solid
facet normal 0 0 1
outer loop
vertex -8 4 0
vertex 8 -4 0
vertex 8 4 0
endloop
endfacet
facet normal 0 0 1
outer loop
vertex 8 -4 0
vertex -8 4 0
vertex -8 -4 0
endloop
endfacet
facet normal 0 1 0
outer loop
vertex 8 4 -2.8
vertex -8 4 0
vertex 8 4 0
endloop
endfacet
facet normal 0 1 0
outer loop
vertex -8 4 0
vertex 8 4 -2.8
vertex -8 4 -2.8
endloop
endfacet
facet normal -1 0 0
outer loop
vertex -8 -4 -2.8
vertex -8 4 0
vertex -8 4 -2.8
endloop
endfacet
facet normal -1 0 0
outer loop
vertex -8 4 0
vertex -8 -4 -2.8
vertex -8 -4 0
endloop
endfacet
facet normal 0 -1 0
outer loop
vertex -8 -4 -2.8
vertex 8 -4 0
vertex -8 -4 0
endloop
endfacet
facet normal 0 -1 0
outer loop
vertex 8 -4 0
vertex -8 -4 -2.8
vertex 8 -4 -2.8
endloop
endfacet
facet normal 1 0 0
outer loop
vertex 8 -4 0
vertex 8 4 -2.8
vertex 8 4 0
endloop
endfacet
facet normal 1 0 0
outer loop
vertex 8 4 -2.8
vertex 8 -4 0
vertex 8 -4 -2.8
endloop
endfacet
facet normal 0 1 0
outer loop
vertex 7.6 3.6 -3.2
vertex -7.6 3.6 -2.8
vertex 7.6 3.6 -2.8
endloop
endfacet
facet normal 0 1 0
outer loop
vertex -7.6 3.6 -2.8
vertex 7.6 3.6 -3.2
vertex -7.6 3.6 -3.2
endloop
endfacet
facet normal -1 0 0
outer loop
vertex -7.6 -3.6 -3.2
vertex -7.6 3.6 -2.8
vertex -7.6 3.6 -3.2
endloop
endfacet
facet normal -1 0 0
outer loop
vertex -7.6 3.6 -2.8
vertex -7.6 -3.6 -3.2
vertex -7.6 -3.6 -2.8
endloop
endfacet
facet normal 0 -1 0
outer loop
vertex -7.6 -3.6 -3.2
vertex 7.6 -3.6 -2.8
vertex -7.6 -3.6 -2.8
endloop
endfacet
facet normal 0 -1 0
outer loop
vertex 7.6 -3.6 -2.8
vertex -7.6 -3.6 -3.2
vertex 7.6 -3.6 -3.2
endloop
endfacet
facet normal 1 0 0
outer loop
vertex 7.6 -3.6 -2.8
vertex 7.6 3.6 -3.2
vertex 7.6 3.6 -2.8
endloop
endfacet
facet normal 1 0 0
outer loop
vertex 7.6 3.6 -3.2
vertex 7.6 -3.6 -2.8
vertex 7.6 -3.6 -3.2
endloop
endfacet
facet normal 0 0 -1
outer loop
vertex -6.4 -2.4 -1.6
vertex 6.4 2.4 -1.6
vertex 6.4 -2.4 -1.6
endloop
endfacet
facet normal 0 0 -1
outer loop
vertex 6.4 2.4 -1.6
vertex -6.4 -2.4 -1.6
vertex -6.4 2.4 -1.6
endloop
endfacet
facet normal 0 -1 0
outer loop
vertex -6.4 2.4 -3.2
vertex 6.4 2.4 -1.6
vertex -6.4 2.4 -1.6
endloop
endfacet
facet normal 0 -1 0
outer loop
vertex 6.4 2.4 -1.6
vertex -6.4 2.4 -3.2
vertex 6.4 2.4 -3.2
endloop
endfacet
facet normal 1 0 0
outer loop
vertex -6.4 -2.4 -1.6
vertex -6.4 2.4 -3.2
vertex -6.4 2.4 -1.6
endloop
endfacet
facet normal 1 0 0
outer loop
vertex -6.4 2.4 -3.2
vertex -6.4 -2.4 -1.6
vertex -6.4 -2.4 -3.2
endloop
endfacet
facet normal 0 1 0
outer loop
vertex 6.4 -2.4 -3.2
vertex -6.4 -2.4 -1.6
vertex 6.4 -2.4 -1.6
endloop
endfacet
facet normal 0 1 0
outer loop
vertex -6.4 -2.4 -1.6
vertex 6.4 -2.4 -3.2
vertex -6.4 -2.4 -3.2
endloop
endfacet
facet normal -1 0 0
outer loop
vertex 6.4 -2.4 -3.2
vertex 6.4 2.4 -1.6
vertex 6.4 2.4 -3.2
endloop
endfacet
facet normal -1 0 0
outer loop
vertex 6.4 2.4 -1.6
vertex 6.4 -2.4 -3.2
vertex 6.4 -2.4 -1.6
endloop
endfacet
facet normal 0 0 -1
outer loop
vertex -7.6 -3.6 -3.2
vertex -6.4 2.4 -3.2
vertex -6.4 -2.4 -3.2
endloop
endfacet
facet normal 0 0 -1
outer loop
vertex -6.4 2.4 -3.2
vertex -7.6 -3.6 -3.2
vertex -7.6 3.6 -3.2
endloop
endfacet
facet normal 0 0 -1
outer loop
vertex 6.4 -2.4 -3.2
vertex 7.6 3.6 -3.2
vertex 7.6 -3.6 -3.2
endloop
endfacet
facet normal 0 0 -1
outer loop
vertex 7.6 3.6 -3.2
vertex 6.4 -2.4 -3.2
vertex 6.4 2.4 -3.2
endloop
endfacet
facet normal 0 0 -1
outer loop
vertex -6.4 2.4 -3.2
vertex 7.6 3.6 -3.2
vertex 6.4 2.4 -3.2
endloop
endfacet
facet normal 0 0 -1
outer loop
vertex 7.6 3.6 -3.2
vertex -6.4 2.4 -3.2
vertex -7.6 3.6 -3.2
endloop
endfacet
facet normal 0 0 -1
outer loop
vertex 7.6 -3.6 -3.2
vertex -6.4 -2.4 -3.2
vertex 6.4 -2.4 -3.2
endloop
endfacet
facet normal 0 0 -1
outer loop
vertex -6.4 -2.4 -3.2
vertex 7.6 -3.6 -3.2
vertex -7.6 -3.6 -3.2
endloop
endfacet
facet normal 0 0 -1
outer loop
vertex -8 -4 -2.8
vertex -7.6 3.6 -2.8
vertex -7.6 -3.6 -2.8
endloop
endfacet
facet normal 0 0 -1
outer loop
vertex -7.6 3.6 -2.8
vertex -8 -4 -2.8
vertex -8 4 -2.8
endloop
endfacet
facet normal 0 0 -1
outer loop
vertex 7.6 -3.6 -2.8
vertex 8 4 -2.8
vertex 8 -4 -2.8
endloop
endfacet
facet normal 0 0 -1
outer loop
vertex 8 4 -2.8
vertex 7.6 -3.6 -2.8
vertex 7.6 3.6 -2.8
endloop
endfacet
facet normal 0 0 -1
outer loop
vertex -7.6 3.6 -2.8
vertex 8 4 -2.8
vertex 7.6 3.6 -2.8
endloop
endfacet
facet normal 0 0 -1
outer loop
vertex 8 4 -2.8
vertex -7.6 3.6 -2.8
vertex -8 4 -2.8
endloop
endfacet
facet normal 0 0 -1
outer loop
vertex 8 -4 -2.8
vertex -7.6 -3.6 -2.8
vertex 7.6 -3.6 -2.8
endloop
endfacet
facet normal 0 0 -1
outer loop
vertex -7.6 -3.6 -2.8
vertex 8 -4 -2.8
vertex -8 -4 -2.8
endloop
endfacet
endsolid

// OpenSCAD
// file: ../p/box5.scad
use <../lib.scad>
function ldraw_lib__box5() = [
// 0 Box with 5 Faces and All Edges
// 0 Name: box5.dat
// 0 Author: James Jessiman
// 0 !LDRAW_ORG Primitive UPDATE 2012-01
// 0 !LICENSE Licensed under CC BY 2.0 and CC BY 4.0 : see CAreadme.txt
// 
// 0 BFC CERTIFY CCW
  [0,"BFC","CERTIFY"],
  [0,"BFC","CCW"],
// 
// 0 !HISTORY 2002-04-03 [sbliss] Modified for BFC compliance
// 0 !HISTORY 2002-04-25 [PTadmin] Official Update 2002-02
// 0 !HISTORY 2007-06-24 [PTadmin] Header formatted for Contributor Agreement
// 0 !HISTORY 2008-07-01 [PTadmin] Official Update 2008-01
// 0 !HISTORY 2012-02-16 [Philo] Changed to CCW
// 0 !HISTORY 2012-03-30 [PTadmin] Official Update 2012-01
// 
// 
// 2 24 1 1 1 -1 1 1
  [2,24,1,1,1,-1,1,1],
// 2 24 -1 1 1 -1 1 -1
  [2,24,-1,1,1,-1,1,-1],
// 2 24 -1 1 -1 1 1 -1
  [2,24,-1,1,-1,1,1,-1],
// 2 24 1 1 -1 1 1 1
  [2,24,1,1,-1,1,1,1],
// 2 24 1 0 1 -1 0 1
  [2,24,1,0,1,-1,0,1],
// 2 24 -1 0 1 -1 0 -1
  [2,24,-1,0,1,-1,0,-1],
// 2 24 -1 0 -1 1 0 -1
  [2,24,-1,0,-1,1,0,-1],
// 2 24 1 0 -1 1 0 1
  [2,24,1,0,-1,1,0,1],
// 2 24 1 0 1 1 1 1
  [2,24,1,0,1,1,1,1],
// 2 24 -1 0 1 -1 1 1
  [2,24,-1,0,1,-1,1,1],
// 2 24 1 0 -1 1 1 -1
  [2,24,1,0,-1,1,1,-1],
// 2 24 -1 0 -1 -1 1 -1
  [2,24,-1,0,-1,-1,1,-1],
// 4 16 -1 1 1 1 1 1 1 1 -1 -1 1 -1
  [4,16,-1,1,1,1,1,1,1,1,-1,-1,1,-1],
// 4 16 -1 1 1 -1 0 1 1 0 1 1 1 1
  [4,16,-1,1,1,-1,0,1,1,0,1,1,1,1],
// 4 16 -1 1 -1 -1 0 -1 -1 0 1 -1 1 1
  [4,16,-1,1,-1,-1,0,-1,-1,0,1,-1,1,1],
// 4 16 1 1 -1 1 0 -1 -1 0 -1 -1 1 -1
  [4,16,1,1,-1,1,0,-1,-1,0,-1,-1,1,-1],
// 4 16 1 1 1 1 0 1 1 0 -1 1 1 -1
  [4,16,1,1,1,1,0,1,1,0,-1,1,1,-1],
];
makepoly(ldraw_lib__box5(), line=0.2);
// file: ../p/box4.scad
use <../lib.scad>
function ldraw_lib__box4() = [
// 0 Box with 4 Faces (2 Parallel Pairs) and All Edges
// 0 Name: box4.dat
// 0 Author: James Jessiman
// 0 !LDRAW_ORG Primitive UPDATE 2012-01
// 0 !LICENSE Licensed under CC BY 2.0 and CC BY 4.0 : see CAreadme.txt
// 
// 0 BFC CERTIFY CCW
  [0,"BFC","CERTIFY"],
  [0,"BFC","CCW"],
// 
// 0 !HISTORY 2002-04-03 [sbliss] Modified for BFC compliance
// 0 !HISTORY 2002-04-25 [PTadmin] Official Update 2002-02
// 0 !HISTORY 2007-06-24 [PTadmin] Header formatted for Contributor Agreement
// 0 !HISTORY 2008-07-01 [PTadmin] Official Update 2008-01
// 0 !HISTORY 2012-02-16 [Philo] Changed to CCW
// 0 !HISTORY 2012-03-30 [PTadmin] Official Update 2012-01
// 
// 
// 2 24 1 1 1 -1 1 1
  [2,24,1,1,1,-1,1,1],
// 2 24 -1 1 1 -1 1 -1
  [2,24,-1,1,1,-1,1,-1],
// 2 24 -1 1 -1 1 1 -1
  [2,24,-1,1,-1,1,1,-1],
// 2 24 1 1 -1 1 1 1
  [2,24,1,1,-1,1,1,1],
// 2 24 1 0 1 -1 0 1
  [2,24,1,0,1,-1,0,1],
// 2 24 -1 0 1 -1 0 -1
  [2,24,-1,0,1,-1,0,-1],
// 2 24 -1 0 -1 1 0 -1
  [2,24,-1,0,-1,1,0,-1],
// 2 24 1 0 -1 1 0 1
  [2,24,1,0,-1,1,0,1],
// 2 24 1 0 1 1 1 1
  [2,24,1,0,1,1,1,1],
// 2 24 -1 0 1 -1 1 1
  [2,24,-1,0,1,-1,1,1],
// 2 24 1 0 -1 1 1 -1
  [2,24,1,0,-1,1,1,-1],
// 2 24 -1 0 -1 -1 1 -1
  [2,24,-1,0,-1,-1,1,-1],
// 4 16 -1 1 1 -1 0 1 1 0 1 1 1 1
  [4,16,-1,1,1,-1,0,1,1,0,1,1,1,1],
// 4 16 -1 1 -1 -1 0 -1 -1 0 1 -1 1 1
  [4,16,-1,1,-1,-1,0,-1,-1,0,1,-1,1,1],
// 4 16 1 1 -1 1 0 -1 -1 0 -1 -1 1 -1
  [4,16,1,1,-1,1,0,-1,-1,0,-1,-1,1,-1],
// 4 16 1 1 1 1 0 1 1 0 -1 1 1 -1
  [4,16,1,1,1,1,0,1,1,0,-1,1,1,-1],
];
makepoly(ldraw_lib__box4(), line=0.2);
// file: s/3069bs01.scad
use <../../lib.scad>
use <../../p/box4.scad>
use <../../p/box5.scad>
function ldraw_lib__s__3069bs01() = [
// 0 ~Tile  1 x  2 with Groove without Top Face
// 0 Name: s\3069bs01.dat
// 0 Author: Santeri Piippo [arezey]
// 0 !LDRAW_ORG Subpart UPDATE 2010-02
// 0 !LICENSE Licensed under CC BY 2.0 and CC BY 4.0 : see CAreadme.txt
// 
// 0 BFC CERTIFY CCW
  [0,"BFC","CERTIFY"],
  [0,"BFC","CCW"],
// 
// 0 !HISTORY 2010-07-05 [PTadmin] Official Update 2010-02
// 
// 
// 1 16 0 0 0 20 0 0 0 7 0 0 0 10 box4.dat
  [1,16,0,0,0,20,0,0,0,7,0,0,0,10, ldraw_lib__box4()],
// 1 16 0 7 0 19 0 0 0 1 0 0 0 9 box4.dat
  [1,16,0,7,0,19,0,0,0,1,0,0,0,9, ldraw_lib__box4()],
// 0 BFC INVERTNEXT
  [0,"BFC","INVERTNEXT"],
// 1 16 0 8 0 16 0 0 0 -4 0 0 0 6 box5.dat
  [1,16,0,8,0,16,0,0,0,-4,0,0,0,6, ldraw_lib__box5()],
// 4 16 -19 8 9 -16 8 6 -16 8 -6 -19 8 -9
  [4,16,-19,8,9,-16,8,6,-16,8,-6,-19,8,-9],
// 4 16 19 8 -9 16 8 -6 16 8 6 19 8 9
  [4,16,19,8,-9,16,8,-6,16,8,6,19,8,9],
// 4 16 19 8 9 16 8 6 -16 8 6 -19 8 9
  [4,16,19,8,9,16,8,6,-16,8,6,-19,8,9],
// 4 16 -19 8 -9 -16 8 -6 16 8 -6 19 8 -9
  [4,16,-19,8,-9,-16,8,-6,16,8,-6,19,8,-9],
// 4 16 -20 7 10 -19 7 9 -19 7 -9 -20 7 -10
  [4,16,-20,7,10,-19,7,9,-19,7,-9,-20,7,-10],
// 4 16 20 7 -10 19 7 -9 19 7 9 20 7 10
  [4,16,20,7,-10,19,7,-9,19,7,9,20,7,10],
// 4 16 20 7 10 19 7 9 -19 7 9 -20 7 10
  [4,16,20,7,10,19,7,9,-19,7,9,-20,7,10],
// 4 16 -20 7 -10 -19 7 -9 19 7 -9 20 7 -10
  [4,16,-20,7,-10,-19,7,-9,19,7,-9,20,7,-10],
// 0 //
];
makepoly(ldraw_lib__s__3069bs01(), line=0.2);
// file: 3069b.scad
use <../lib.scad>
use <s/3069bs01.scad>
function ldraw_lib__3069b() = [
// 0 Tile  1 x  2 with Groove
// 0 Name: 3069b.dat
// 0 Author: Santeri Piippo [arezey]
// 0 !LDRAW_ORG Part UPDATE 2010-02
// 0 !LICENSE Licensed under CC BY 2.0 and CC BY 4.0 : see CAreadme.txt
// 
// 0 BFC CERTIFY CCW
  [0,"BFC","CERTIFY"],
  [0,"BFC","CCW"],
// 
// 0 !HISTORY 2010-07-05 [PTadmin] Official Update 2010-02
// 
// 
// 4 16 20 0 -10 20 0 10 -20 0 10 -20 0 -10
  [4,16,20,0,-10,20,0,10,-20,0,10,-20,0,-10],
// 1 16 0 0 0 1 0 0 0 1 0 0 0 1 s\3069bs01.dat
  [1,16,0,0,0,1,0,0,0,1,0,0,0,1, ldraw_lib__s__3069bs01()],
// 0 //
];
makepoly(ldraw_lib__3069b(), line=0.2);
// main file
use <../lib.scad>
use <3069b.scad>
function ldraw_lib__3069() = [
// 0 ~Moved to 3069b
// 0 Name: 3069.dat
// 0 Author: [PTadmin]
// 0 !LDRAW_ORG Part UPDATE 2003-02
// 0 !LICENSE Licensed under CC BY 4.0 : see CAreadme.txt
// 
// 0 BFC CERTIFY CCW
  [0,"BFC","CERTIFY"],
  [0,"BFC","CCW"],
// 
// 0 !HISTORY 2003-08-01 [PTadmin] Official Update 2003-02
// 0 !HISTORY 2007-06-13 [PTadmin] Header formatted for Contributor Agreement
// 0 !HISTORY 2008-07-01 [PTadmin] Official Update 2008-01
// 
// 
// 1 16 0 0 0 1 0 0 0 1 0 0 0 1 3069b.dat
  [1,16,0,0,0,1,0,0,0,1,0,0,0,1, ldraw_lib__3069b()],
];
makepoly(ldraw_lib__3069(), line=0.2);
